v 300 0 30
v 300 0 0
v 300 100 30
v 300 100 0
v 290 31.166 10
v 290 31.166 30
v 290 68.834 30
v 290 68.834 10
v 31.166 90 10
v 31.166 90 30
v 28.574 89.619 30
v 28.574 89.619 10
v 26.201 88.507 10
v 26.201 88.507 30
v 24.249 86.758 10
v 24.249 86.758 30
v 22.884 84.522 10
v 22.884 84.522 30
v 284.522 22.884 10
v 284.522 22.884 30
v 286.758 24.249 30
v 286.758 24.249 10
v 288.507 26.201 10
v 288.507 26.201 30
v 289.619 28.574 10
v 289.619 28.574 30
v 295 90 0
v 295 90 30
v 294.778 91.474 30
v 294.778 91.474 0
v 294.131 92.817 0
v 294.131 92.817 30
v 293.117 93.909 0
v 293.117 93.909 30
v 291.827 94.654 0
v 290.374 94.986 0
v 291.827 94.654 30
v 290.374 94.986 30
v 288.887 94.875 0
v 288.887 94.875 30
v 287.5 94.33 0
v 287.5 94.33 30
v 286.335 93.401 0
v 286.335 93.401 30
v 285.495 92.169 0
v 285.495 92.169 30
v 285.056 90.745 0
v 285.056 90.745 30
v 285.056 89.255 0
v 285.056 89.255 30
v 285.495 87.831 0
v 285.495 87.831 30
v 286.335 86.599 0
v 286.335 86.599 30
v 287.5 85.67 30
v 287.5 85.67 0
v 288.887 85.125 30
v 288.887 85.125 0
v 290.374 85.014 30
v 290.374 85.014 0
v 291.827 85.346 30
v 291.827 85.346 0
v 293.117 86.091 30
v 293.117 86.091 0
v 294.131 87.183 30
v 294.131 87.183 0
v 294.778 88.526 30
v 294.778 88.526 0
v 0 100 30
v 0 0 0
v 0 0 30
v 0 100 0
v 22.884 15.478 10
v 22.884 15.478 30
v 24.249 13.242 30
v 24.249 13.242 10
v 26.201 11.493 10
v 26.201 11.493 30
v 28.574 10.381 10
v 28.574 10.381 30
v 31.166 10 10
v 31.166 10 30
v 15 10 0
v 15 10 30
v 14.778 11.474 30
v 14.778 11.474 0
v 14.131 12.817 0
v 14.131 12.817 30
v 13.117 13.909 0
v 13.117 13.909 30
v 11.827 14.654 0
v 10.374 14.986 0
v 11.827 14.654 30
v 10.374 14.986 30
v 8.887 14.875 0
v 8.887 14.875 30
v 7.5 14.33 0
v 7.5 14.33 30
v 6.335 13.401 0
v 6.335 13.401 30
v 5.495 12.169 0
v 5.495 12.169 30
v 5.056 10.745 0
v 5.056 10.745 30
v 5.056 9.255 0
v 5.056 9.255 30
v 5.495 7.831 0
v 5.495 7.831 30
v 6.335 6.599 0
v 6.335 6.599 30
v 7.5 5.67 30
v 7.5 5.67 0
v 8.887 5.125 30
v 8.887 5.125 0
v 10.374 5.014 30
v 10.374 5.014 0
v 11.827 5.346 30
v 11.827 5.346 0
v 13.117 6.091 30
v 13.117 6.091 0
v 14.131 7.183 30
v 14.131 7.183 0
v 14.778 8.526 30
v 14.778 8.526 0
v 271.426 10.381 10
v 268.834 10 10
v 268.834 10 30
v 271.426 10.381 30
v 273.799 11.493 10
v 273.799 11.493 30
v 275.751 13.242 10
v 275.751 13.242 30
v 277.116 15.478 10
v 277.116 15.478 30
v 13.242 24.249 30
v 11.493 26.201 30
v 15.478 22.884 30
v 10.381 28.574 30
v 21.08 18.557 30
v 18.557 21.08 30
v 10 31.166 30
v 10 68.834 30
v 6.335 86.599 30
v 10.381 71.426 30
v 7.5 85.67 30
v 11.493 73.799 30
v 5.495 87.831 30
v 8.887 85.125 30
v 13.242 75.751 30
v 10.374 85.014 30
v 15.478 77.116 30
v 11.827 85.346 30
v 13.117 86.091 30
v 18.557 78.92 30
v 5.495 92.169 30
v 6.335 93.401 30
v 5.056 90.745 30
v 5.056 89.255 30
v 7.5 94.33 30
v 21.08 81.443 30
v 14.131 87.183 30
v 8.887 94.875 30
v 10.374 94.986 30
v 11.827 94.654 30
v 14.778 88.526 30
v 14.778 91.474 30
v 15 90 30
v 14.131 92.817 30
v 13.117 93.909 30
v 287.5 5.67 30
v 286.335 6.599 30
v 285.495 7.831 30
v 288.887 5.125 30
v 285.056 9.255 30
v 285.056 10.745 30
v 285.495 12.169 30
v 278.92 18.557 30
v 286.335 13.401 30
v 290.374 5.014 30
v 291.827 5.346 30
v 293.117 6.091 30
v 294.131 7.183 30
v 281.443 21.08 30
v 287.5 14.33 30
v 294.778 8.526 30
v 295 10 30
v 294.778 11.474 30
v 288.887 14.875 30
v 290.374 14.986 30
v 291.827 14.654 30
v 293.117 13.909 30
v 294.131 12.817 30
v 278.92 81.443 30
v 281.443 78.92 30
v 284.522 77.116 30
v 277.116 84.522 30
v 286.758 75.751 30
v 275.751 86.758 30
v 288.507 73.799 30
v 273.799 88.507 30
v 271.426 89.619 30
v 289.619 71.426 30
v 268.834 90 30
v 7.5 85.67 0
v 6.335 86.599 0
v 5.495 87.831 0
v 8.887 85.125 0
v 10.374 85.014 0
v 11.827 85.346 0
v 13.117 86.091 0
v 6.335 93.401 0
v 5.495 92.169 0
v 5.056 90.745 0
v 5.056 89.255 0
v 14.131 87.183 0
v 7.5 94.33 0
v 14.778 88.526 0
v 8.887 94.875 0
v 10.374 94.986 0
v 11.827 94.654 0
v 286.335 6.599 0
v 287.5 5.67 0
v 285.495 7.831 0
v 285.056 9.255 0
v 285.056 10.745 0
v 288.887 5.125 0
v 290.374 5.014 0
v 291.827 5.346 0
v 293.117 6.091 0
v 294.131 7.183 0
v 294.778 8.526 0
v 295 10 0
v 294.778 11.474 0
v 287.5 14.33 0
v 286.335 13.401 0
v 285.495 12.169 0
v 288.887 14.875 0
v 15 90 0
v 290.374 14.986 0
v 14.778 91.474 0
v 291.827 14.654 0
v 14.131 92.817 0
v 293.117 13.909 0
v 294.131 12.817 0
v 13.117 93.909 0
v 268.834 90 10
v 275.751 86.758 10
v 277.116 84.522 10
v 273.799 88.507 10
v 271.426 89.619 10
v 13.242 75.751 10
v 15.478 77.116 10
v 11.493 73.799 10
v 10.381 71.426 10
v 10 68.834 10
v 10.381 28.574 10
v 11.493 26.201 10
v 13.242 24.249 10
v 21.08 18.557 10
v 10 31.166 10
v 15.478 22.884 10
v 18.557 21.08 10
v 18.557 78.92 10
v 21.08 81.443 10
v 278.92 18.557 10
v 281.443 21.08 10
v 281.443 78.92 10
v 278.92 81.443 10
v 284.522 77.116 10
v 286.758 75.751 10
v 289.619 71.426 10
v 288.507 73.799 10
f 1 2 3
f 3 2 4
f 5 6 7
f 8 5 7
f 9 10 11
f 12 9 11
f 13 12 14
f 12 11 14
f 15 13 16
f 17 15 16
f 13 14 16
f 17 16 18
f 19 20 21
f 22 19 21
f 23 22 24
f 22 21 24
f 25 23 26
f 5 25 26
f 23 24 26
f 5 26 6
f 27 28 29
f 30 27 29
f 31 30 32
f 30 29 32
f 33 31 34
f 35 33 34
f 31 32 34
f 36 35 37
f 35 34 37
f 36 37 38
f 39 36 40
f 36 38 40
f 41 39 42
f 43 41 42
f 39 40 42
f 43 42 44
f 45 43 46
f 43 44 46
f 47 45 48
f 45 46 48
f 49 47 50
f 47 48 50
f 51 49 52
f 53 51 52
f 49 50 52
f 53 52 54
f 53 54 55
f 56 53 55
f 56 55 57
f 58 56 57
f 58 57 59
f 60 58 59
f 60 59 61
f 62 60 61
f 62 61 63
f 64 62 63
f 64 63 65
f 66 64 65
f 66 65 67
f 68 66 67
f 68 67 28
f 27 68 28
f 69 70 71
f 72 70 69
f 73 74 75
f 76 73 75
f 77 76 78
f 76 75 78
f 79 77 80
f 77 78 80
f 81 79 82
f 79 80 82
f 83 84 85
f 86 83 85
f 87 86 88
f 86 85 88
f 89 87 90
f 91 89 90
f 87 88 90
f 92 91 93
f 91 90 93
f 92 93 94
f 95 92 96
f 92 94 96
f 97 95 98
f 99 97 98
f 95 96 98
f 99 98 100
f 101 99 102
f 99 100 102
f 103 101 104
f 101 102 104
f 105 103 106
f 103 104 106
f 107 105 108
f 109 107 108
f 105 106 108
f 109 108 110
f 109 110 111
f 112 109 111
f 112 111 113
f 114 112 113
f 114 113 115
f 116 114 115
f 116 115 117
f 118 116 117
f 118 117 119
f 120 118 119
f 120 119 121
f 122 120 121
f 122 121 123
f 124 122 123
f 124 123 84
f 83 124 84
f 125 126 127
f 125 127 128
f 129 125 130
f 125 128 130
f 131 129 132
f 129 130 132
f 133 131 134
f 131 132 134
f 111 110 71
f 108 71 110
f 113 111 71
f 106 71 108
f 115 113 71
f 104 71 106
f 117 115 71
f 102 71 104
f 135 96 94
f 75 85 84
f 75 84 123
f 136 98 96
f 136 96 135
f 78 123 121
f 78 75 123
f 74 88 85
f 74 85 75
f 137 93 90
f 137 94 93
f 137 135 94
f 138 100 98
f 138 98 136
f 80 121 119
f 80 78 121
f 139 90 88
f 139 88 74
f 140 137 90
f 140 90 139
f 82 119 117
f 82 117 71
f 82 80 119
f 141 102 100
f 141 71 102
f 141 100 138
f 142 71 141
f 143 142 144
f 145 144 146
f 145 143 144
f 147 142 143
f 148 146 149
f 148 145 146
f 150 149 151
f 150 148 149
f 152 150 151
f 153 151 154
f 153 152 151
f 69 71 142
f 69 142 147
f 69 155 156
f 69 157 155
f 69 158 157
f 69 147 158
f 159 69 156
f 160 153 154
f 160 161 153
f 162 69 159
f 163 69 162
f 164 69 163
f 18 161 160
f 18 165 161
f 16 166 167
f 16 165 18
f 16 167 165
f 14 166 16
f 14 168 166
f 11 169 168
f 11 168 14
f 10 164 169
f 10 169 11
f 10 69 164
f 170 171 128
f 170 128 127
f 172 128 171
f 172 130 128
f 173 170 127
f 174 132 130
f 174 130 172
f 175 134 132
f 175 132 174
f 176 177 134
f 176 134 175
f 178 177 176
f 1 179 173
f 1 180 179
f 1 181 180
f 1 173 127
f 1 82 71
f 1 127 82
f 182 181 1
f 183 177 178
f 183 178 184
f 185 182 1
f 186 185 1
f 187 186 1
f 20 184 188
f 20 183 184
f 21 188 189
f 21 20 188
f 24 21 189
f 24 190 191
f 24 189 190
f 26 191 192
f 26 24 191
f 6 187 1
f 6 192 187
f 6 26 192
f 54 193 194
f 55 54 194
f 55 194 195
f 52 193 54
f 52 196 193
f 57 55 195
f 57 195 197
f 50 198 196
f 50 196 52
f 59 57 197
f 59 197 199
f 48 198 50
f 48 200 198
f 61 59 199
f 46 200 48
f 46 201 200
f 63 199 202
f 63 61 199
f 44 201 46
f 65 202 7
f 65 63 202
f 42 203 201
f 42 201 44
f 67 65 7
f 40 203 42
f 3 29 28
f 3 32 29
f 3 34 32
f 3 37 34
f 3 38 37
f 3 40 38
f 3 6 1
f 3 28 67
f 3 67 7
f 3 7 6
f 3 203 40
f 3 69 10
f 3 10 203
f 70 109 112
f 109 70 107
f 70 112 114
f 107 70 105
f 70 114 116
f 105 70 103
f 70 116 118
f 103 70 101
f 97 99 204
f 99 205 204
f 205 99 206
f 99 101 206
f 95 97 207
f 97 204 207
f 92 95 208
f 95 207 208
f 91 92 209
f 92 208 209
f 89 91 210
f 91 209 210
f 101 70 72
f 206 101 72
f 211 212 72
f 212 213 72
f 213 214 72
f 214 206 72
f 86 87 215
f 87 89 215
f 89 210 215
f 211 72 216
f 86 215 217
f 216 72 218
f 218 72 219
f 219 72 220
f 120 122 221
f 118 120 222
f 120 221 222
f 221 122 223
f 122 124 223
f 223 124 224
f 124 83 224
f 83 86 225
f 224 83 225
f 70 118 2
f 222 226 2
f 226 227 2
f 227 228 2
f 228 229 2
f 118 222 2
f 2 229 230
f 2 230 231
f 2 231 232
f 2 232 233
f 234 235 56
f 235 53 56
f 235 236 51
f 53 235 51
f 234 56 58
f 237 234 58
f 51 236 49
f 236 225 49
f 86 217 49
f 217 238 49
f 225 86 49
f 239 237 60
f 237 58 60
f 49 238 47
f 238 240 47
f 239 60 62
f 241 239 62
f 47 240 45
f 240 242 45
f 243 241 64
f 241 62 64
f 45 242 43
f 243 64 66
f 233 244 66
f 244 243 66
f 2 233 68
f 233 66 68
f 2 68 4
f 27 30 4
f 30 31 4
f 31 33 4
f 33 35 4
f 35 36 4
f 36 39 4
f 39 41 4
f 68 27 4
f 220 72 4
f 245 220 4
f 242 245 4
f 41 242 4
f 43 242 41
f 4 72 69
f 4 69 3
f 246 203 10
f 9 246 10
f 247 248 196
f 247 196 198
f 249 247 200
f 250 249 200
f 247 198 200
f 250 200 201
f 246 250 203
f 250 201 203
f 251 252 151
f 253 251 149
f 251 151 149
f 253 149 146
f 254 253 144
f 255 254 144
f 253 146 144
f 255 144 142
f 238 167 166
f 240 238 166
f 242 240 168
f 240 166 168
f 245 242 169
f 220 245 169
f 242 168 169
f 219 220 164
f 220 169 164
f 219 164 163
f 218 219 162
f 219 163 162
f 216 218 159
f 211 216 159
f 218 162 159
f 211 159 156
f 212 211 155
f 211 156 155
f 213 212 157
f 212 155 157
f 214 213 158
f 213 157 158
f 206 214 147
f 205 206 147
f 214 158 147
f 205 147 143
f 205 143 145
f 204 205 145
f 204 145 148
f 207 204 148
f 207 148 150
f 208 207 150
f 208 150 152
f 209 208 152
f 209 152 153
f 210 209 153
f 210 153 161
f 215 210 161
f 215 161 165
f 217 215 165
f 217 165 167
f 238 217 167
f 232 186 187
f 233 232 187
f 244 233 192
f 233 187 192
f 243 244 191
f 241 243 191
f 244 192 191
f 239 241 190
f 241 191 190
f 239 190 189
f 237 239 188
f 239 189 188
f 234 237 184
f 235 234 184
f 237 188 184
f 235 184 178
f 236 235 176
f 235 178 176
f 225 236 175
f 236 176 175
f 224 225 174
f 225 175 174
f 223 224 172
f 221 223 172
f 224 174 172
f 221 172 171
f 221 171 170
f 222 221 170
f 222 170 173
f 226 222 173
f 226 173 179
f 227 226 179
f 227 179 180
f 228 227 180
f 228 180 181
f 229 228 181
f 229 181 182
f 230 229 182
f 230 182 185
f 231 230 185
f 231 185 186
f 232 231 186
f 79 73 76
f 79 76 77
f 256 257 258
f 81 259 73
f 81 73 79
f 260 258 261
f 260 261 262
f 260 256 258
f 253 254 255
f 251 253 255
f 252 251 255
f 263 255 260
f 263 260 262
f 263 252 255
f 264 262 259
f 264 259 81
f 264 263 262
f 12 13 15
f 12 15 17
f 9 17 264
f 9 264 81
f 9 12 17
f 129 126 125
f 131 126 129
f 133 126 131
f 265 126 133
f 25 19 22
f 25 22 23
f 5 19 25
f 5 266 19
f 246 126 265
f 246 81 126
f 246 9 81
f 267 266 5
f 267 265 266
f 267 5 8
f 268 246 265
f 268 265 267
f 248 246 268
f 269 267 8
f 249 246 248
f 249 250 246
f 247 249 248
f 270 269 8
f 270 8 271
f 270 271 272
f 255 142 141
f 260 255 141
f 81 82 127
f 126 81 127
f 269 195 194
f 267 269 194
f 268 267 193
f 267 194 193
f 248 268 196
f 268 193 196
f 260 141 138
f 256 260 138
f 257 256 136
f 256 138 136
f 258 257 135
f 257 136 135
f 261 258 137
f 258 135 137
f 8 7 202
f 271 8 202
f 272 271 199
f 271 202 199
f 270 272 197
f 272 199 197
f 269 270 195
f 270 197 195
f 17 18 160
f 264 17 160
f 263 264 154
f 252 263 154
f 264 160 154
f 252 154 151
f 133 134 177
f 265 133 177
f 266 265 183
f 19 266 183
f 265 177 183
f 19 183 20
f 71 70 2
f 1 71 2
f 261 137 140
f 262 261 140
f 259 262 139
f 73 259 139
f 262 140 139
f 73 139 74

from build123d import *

# Parameters (mm, degrees)
F0_W     = 300
F0_H     = 100
F1_DEPTH = 30
F3_DEPTH = 20
F4_R     = 5
F5_DEPTH = 30.001


with BuildPart() as f1:
    # F0 (on Top) → F1 (new body)
    with BuildSketch(Plane.XY):
        with Locations((150, 50)):
            Rectangle(F0_W, F0_H)
    extrude(amount=F1_DEPTH)

    # F2 (on face) → F3 (cut)
    with BuildSketch(Plane.XY.offset(30)):
        with BuildLine():
            Line((268.83399, 90), (150, 90))
            Line((150, 90), (31.16601, 90))
            ThreePointArc((31.16601, 90), (26.200915, 88.506519), (22.883659, 84.521739))
            ThreePointArc((22.883659, 84.521739), (19.899495, 80.100505), (15.478261, 77.116341))
            ThreePointArc((15.478261, 77.116341), (11.493481, 73.799085), (10, 68.83399))
            Line((10, 68.83399), (10, 50))
            Line((10, 50), (10, 31.16601))
            ThreePointArc((10, 31.16601), (11.493481, 26.200915), (15.478261, 22.883659))
            ThreePointArc((15.478261, 22.883659), (19.899495, 19.899495), (22.883659, 15.478261))
            ThreePointArc((22.883659, 15.478261), (26.200915, 11.493481), (31.16601, 10))
            Line((31.16601, 10), (150, 10))
            Line((150, 10), (268.83399, 10))
            ThreePointArc((268.83399, 10), (273.799085, 11.493481), (277.116341, 15.478261))
            ThreePointArc((277.116341, 15.478261), (280.100505, 19.899495), (284.521739, 22.883659))
            ThreePointArc((284.521739, 22.883659), (288.506519, 26.200915), (290, 31.16601))
            Line((290, 31.16601), (290, 50))
            Line((290, 50), (290, 68.83399))
            ThreePointArc((290, 68.83399), (288.506519, 73.799085), (284.521739, 77.116341))
            ThreePointArc((284.521739, 77.116341), (280.100505, 80.100505), (277.116341, 84.521739))
            ThreePointArc((277.116341, 84.521739), (273.799085, 88.506519), (268.83399, 90))
        make_face()
    extrude(amount=-F3_DEPTH, mode=Mode.SUBTRACT)

    # F4 (on face) → F5 (cut, through all)
    with BuildSketch(Plane.XY.offset(30)):
        with Locations((290, 90)):
            Circle(F4_R)
        with Locations((10, 90)):
            Circle(F4_R)
        with Locations((10, 10)):
            Circle(F4_R)
        with Locations((290, 10)):
            Circle(F4_R)
    extrude(amount=-F5_DEPTH, mode=Mode.SUBTRACT)


solid = f1.part
